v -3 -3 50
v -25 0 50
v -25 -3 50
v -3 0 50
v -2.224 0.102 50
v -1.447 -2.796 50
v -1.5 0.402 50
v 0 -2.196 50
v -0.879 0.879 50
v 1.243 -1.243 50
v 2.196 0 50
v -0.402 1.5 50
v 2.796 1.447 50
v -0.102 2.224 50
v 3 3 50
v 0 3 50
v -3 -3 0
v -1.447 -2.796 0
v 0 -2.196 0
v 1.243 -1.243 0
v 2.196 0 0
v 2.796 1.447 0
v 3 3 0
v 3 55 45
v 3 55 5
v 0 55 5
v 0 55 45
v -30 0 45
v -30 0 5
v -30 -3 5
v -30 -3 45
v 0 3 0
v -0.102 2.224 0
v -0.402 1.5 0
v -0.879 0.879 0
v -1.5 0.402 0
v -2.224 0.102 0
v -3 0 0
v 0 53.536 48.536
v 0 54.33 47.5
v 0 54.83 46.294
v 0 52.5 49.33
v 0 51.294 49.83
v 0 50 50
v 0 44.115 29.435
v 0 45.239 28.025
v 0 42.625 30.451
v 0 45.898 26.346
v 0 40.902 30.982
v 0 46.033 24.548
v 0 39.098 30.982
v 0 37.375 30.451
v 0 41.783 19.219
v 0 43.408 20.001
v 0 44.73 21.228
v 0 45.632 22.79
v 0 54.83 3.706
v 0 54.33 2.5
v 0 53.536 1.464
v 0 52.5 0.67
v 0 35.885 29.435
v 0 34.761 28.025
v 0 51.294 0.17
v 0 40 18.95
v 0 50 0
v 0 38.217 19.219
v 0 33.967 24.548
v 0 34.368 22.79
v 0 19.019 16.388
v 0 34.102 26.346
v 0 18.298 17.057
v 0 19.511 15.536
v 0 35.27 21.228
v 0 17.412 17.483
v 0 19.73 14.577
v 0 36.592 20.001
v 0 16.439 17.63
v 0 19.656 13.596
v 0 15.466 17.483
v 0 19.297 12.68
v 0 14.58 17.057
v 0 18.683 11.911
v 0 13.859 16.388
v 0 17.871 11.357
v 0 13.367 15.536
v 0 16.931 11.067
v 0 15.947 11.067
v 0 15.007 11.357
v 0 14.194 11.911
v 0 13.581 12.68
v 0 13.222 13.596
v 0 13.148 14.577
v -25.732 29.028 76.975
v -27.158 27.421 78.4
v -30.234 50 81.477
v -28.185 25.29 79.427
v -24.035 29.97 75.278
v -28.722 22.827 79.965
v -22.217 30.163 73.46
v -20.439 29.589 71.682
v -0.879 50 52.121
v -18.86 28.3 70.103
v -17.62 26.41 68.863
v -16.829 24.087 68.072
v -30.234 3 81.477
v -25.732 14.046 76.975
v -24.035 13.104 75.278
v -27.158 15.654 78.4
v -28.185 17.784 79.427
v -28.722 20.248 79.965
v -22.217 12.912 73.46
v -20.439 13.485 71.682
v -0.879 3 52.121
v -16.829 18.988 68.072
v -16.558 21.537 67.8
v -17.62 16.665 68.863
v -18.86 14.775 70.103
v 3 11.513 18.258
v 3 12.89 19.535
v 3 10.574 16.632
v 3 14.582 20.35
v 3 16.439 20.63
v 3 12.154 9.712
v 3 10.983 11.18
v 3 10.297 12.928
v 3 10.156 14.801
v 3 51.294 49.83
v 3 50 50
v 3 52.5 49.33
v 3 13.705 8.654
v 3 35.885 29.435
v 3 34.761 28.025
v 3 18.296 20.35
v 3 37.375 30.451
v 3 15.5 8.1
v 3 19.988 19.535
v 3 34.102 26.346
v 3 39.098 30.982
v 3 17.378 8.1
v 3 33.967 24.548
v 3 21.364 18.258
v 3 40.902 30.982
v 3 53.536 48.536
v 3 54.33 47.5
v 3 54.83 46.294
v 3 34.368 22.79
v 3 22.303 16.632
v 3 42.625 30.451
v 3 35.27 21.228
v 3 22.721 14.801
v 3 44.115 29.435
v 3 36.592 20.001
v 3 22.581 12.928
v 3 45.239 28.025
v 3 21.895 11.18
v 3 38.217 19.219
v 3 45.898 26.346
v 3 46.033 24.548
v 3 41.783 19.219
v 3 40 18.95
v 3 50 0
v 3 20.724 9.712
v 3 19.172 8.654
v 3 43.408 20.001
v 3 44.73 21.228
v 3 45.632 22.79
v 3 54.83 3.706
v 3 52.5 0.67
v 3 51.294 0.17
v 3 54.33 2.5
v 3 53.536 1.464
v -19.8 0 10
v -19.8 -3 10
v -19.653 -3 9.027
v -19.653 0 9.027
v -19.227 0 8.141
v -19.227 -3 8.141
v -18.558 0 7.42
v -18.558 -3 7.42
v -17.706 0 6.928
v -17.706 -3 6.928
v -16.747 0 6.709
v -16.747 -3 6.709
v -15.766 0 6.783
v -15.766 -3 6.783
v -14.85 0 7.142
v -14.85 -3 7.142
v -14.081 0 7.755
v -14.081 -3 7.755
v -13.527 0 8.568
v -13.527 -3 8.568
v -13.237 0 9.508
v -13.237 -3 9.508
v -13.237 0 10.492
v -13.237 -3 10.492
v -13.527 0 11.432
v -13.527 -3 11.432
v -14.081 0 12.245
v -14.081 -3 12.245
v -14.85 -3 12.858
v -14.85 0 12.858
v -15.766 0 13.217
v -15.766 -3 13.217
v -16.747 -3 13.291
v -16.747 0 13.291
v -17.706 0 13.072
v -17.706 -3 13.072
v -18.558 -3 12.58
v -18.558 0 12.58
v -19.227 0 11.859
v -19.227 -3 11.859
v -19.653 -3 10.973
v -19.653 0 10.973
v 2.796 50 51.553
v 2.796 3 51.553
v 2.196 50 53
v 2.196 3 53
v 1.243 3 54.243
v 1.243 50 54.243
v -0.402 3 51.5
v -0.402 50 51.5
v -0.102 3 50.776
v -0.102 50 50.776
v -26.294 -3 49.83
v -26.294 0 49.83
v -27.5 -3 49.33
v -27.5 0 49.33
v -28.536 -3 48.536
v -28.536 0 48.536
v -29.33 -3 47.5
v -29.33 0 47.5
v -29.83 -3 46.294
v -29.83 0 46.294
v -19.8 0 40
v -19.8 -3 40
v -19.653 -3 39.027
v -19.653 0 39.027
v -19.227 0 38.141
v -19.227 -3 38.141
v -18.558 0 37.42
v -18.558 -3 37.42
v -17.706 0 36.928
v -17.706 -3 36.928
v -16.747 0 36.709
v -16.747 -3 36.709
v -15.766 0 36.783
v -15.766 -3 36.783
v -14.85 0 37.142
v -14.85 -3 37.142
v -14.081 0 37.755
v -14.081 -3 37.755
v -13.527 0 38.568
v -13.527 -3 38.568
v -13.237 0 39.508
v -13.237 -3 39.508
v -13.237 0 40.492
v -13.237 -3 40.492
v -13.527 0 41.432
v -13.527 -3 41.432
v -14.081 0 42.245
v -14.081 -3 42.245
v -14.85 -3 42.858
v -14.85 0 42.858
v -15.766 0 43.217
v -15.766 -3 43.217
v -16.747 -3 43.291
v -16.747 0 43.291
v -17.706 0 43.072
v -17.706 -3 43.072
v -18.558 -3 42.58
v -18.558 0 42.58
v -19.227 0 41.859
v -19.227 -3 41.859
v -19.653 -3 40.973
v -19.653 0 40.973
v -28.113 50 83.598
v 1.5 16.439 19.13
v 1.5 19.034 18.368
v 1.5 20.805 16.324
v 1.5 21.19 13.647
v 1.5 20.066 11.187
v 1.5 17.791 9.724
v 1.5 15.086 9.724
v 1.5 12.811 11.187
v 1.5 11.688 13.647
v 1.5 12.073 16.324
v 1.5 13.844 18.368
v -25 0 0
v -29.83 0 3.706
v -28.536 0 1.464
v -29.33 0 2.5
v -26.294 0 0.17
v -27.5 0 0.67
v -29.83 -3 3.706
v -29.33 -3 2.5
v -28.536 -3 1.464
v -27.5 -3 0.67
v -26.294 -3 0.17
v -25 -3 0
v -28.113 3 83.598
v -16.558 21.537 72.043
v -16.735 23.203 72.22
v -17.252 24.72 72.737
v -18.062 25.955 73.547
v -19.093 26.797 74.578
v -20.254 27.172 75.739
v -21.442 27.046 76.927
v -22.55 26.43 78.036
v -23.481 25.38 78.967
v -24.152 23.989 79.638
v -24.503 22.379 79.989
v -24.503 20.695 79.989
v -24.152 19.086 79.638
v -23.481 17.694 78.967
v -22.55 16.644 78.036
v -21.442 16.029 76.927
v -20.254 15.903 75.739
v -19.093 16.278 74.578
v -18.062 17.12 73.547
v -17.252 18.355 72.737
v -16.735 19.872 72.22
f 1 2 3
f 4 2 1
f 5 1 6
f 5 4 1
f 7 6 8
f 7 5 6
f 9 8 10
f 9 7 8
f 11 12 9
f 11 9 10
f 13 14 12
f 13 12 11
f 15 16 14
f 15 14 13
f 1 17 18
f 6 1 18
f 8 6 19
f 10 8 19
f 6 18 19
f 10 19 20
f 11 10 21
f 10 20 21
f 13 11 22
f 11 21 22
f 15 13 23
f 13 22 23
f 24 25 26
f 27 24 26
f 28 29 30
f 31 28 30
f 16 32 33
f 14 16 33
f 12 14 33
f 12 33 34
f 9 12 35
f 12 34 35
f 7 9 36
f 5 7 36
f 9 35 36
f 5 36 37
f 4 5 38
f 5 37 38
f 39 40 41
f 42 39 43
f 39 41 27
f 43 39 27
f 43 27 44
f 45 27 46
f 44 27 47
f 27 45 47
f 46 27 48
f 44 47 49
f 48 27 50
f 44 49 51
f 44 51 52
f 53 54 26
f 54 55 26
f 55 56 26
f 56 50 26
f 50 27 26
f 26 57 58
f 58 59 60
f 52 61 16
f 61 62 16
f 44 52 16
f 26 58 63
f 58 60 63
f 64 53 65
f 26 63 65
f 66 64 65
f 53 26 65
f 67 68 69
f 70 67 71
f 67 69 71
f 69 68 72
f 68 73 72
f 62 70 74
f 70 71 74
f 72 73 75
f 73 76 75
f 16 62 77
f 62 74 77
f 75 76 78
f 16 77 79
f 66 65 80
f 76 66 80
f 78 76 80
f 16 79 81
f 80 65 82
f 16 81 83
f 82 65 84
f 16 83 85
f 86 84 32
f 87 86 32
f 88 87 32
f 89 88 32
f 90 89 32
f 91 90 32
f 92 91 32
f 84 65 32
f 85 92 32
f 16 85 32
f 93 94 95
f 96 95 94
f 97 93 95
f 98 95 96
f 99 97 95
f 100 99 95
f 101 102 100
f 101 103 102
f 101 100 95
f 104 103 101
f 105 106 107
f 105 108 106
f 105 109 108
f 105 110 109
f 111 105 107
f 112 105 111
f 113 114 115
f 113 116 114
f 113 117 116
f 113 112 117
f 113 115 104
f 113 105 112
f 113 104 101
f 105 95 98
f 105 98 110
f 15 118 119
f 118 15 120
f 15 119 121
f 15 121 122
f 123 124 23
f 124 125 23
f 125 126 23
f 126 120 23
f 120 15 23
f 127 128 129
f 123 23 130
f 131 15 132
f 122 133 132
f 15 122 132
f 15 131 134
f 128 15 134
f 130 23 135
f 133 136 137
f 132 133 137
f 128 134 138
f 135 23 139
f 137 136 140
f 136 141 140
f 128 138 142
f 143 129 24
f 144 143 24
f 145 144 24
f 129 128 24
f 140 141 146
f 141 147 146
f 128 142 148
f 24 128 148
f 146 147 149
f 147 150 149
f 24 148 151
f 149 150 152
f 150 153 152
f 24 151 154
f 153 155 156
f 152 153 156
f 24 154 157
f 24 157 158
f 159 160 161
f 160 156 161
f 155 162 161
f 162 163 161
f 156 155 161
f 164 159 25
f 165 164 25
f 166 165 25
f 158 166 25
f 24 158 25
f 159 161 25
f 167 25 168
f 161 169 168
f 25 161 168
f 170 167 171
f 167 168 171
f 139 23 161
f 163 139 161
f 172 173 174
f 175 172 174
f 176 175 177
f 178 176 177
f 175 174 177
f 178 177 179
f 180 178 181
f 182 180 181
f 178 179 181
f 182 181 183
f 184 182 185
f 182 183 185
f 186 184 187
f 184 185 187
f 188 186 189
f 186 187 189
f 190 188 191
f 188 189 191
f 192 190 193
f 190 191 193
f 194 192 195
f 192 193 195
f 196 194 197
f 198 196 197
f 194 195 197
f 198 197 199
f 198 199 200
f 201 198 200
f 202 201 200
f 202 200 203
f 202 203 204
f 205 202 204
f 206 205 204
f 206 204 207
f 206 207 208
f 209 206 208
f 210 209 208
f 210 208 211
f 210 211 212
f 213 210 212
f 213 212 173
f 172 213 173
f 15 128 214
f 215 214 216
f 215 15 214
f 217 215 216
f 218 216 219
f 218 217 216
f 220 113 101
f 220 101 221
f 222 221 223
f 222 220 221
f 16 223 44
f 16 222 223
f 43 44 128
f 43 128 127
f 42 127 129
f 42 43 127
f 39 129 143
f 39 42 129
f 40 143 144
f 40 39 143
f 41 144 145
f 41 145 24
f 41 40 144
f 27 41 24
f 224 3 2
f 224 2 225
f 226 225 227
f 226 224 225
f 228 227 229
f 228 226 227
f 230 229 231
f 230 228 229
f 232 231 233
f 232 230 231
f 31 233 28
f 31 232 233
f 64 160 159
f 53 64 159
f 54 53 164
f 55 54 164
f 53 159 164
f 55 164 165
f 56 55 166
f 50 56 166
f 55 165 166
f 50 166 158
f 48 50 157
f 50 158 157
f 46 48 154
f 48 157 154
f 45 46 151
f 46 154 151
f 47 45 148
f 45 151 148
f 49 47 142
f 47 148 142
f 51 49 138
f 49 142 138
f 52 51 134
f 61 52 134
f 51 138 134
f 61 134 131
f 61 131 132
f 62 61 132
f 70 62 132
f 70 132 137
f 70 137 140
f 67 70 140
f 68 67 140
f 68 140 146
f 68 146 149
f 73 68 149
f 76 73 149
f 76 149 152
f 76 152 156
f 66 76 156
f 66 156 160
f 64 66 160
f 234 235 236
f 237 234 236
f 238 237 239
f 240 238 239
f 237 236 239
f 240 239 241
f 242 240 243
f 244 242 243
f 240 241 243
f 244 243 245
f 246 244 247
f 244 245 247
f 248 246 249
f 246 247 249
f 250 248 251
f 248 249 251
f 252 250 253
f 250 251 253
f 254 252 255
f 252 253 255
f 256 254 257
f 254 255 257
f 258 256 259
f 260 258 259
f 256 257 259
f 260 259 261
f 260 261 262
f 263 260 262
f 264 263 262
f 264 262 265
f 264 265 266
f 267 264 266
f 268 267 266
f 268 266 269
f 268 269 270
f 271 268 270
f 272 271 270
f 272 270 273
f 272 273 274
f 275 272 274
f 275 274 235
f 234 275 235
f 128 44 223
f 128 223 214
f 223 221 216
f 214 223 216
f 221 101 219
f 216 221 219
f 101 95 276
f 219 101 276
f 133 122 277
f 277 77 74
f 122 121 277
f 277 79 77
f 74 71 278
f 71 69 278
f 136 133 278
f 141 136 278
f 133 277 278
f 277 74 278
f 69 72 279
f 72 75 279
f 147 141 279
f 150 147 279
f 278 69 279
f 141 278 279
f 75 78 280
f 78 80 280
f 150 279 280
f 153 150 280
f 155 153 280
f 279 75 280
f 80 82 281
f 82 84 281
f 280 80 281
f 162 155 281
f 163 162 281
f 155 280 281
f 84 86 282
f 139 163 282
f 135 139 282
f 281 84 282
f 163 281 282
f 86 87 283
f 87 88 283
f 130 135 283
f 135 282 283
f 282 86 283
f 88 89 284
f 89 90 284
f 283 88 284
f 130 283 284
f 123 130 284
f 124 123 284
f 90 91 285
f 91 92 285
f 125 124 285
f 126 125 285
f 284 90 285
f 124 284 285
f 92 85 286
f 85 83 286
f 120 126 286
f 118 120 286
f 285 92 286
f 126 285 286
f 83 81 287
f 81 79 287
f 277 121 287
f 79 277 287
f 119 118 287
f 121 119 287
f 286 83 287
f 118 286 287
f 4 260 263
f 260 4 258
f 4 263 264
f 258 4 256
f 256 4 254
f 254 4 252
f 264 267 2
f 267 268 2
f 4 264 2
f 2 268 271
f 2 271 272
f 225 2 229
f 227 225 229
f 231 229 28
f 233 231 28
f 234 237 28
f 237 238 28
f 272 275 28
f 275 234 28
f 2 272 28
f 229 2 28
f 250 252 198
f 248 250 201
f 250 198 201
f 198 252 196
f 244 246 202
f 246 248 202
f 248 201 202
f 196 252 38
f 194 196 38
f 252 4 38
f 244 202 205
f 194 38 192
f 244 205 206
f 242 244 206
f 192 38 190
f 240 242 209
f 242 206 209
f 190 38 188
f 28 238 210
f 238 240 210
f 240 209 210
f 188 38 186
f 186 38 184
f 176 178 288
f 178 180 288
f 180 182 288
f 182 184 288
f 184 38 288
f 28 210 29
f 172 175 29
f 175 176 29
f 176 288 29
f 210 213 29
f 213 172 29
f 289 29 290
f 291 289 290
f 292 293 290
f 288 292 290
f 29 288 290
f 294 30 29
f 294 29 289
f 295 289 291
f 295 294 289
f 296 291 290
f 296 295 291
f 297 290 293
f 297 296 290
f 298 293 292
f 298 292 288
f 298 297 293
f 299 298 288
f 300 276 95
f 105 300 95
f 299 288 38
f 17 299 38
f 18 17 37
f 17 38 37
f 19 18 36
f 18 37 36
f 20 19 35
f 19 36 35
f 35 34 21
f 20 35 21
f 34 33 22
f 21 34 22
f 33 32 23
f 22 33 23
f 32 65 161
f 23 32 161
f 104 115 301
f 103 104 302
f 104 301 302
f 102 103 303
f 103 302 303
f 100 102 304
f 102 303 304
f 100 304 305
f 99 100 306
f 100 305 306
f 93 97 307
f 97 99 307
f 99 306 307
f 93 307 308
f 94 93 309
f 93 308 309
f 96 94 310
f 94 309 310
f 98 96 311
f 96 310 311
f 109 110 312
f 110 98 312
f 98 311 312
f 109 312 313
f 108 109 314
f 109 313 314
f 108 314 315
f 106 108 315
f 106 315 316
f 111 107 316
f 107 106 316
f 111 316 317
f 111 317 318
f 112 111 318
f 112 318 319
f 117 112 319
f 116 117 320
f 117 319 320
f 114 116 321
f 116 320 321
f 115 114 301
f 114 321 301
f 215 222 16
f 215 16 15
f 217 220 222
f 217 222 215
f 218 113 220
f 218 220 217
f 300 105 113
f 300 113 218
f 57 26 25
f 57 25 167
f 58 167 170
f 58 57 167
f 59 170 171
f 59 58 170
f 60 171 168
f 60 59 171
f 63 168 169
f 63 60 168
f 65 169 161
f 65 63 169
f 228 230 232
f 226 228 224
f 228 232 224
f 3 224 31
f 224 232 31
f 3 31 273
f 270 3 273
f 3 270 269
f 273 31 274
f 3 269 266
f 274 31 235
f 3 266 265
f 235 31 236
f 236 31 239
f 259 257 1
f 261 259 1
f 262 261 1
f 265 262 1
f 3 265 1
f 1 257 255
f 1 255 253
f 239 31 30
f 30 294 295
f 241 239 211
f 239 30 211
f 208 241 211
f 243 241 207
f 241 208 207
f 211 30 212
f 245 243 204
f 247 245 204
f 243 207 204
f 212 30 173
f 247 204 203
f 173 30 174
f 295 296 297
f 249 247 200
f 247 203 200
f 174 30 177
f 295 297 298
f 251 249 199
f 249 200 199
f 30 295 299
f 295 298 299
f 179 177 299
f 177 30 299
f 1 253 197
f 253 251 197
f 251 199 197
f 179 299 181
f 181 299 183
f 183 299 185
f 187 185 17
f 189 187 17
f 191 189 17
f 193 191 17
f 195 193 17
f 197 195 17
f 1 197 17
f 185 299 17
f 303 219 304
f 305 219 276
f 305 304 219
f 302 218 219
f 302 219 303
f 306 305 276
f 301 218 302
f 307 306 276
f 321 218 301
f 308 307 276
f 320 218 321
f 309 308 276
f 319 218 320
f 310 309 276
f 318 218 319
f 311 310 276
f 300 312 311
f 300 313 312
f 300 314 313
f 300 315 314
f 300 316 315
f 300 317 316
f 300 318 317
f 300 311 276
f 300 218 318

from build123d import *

# Parameters (mm, degrees)
BASE_FLANGE1_DEPTH                                  = 50
M12_CLEARANCE_HOLE1_D                               = 12.1
M6_CLEARANCE_HOLE1_D                                = 6.6
BREAK_CORNER1_START                                 = -3
BREAK_CORNER1_DEPTH                                 = 3
BREAK_CORNER1_2_DEPTH                               = 3
EDGE_FLANGE2_DEPTH                                  = 47
CSK_FOR_M8_COUNTERSUNK_FLAT_HEAD_SCREW1_D           = 9
CSK_FOR_M8_COUNTERSUNK_FLAT_HEAD_SCREW1_CSINK_D     = 17.3
CSK_FOR_M8_COUNTERSUNK_FLAT_HEAD_SCREW1_CSINK_ANGLE = 90
CSK_FOR_M6_COUNTERSUNK_FLAT_HEAD_SCREW1_D           = 6.6
CSK_FOR_M6_COUNTERSUNK_FLAT_HEAD_SCREW1_CSINK_D     = 12.6
CSK_FOR_M6_COUNTERSUNK_FLAT_HEAD_SCREW1_CSINK_ANGLE = 90


# Read off the part's stored shape, not the designer's step: Break-Corner1
# Sheet-metal steps are written as plain solids
with BuildPart() as part:
    # Sketch1 → Base-Flange1 (new body)
    with BuildSketch(Plane.XY):
        with BuildLine():
            Line((0, 55), (0, 3))
            ThreePointArc((0, 3), (-0.878679656, 0.878679656), (-3, 0))
            Line((-3, 0), (-30, 0))
            Line((-30, 0), (-30, -3))
            Line((-30, -3), (-3, -3))
            ThreePointArc((-3, -3), (1.242640687, -1.242640687), (3, 3))
            Line((3, 3), (3, 55))
            Line((3, 55), (0, 55))
        make_face()
    extrude(amount=BASE_FLANGE1_DEPTH)

    # M12 Clearance Hole1 (through all)
    with Locations(Plane.ZY):
        with Locations((25, 40)):
            Hole(M12_CLEARANCE_HOLE1_D / 2)

    # M6 Clearance Hole1 (through all)
    with Locations(Plane(origin=(0, 0, 0), x_dir=(1, 0, 0), z_dir=(0, 1, 0))):
        with Locations((-16.5, -40), (-16.5, -10)):
            Hole(M6_CLEARANCE_HOLE1_D / 2)

    # Break-Corner1 outline → Break-Corner1 (cut)
    with BuildSketch(Plane(origin=(0, 0, 0), x_dir=(1, 0, 0), z_dir=(0, 1, 0)).offset(BREAK_CORNER1_START)):
        with BuildLine():
            Line((-30, -50), (-25, -50))
            ThreePointArc((-25, -50), (-28.535533906, -48.535533906), (-30, -45))
            Line((-30, -45), (-30, -50))
        make_face()
        with BuildLine():
            Line((-30, 0), (-30, -5))
            ThreePointArc((-30, -5), (-28.535533906, -1.464466094), (-25, 0))
            Line((-25, 0), (-30, 0))
        make_face()
    extrude(amount=BREAK_CORNER1_DEPTH, mode=Mode.SUBTRACT)

    # Break-Corner1 2 outline → Break-Corner1 2 (cut)
    with BuildSketch(Plane.YZ):
        with BuildLine():
            Line((55, 0), (55, 5))
            ThreePointArc((55, 5), (53.535533906, 1.464466094), (50, 0))
            Line((50, 0), (55, 0))
        make_face()
        with BuildLine():
            ThreePointArc((50, 50), (53.535533906, 48.535533906), (55, 45))
            Line((55, 45), (55, 50))
            Line((55, 50), (50, 50))
        make_face()
    extrude(amount=BREAK_CORNER1_2_DEPTH, mode=Mode.SUBTRACT)

    # Edge-Flange2 section (across the edge) → Edge-Flange2 (add)
    with BuildSketch(Plane(origin=(0, 3, 51.242640687), x_dir=(-0.7071067811865512, 0, -0.7071067811865438), z_dir=(0, 1, 0))):
        with BuildLine():
            Line((-3, 1.242640687), (-3, 42.757359313))
            Line((-3, 42.757359313), (0, 42.757359313))
            Line((0, 42.757359313), (0, 1.242640687))
            ThreePointArc((0, 1.242640687), (0.228361402, 0.09459039), (0.878679656, -0.878679656))
            Line((0.878679656, -0.878679656), (-1.242640687, -3))
            ThreePointArc((-1.242640687, -3), (-2.543277195, -1.053459907), (-3, 1.242640687))
        make_face()
    extrude(amount=EDGE_FLANGE2_DEPTH)

    # CSK for M8 Countersunk Flat Head Screw1 (through all)
    with Locations(Plane(origin=(25.621320344, 0, 25.621320344), x_dir=(-0.7071067811865437, 0, 0.7071067811865513), z_dir=(-0.7071067811865513, 0, -0.7071067811865437))):
        with Locations((68.299943249, 21.537354557)):
            CounterSinkHole(CSK_FOR_M8_COUNTERSUNK_FLAT_HEAD_SCREW1_D / 2, CSK_FOR_M8_COUNTERSUNK_FLAT_HEAD_SCREW1_CSINK_D / 2, counter_sink_angle=CSK_FOR_M8_COUNTERSUNK_FLAT_HEAD_SCREW1_CSINK_ANGLE)

    # CSK for M6 Countersunk Flat Head Screw1 (through all)
    with Locations(Plane(origin=(3, 0, 0), x_dir=(0, 0, -1), z_dir=(1, 0, 0))):
        with Locations((-14.330047328, 16.438814783)):
            CounterSinkHole(CSK_FOR_M6_COUNTERSUNK_FLAT_HEAD_SCREW1_D / 2, CSK_FOR_M6_COUNTERSUNK_FLAT_HEAD_SCREW1_CSINK_D / 2, counter_sink_angle=CSK_FOR_M6_COUNTERSUNK_FLAT_HEAD_SCREW1_CSINK_ANGLE)


solid = part.part
